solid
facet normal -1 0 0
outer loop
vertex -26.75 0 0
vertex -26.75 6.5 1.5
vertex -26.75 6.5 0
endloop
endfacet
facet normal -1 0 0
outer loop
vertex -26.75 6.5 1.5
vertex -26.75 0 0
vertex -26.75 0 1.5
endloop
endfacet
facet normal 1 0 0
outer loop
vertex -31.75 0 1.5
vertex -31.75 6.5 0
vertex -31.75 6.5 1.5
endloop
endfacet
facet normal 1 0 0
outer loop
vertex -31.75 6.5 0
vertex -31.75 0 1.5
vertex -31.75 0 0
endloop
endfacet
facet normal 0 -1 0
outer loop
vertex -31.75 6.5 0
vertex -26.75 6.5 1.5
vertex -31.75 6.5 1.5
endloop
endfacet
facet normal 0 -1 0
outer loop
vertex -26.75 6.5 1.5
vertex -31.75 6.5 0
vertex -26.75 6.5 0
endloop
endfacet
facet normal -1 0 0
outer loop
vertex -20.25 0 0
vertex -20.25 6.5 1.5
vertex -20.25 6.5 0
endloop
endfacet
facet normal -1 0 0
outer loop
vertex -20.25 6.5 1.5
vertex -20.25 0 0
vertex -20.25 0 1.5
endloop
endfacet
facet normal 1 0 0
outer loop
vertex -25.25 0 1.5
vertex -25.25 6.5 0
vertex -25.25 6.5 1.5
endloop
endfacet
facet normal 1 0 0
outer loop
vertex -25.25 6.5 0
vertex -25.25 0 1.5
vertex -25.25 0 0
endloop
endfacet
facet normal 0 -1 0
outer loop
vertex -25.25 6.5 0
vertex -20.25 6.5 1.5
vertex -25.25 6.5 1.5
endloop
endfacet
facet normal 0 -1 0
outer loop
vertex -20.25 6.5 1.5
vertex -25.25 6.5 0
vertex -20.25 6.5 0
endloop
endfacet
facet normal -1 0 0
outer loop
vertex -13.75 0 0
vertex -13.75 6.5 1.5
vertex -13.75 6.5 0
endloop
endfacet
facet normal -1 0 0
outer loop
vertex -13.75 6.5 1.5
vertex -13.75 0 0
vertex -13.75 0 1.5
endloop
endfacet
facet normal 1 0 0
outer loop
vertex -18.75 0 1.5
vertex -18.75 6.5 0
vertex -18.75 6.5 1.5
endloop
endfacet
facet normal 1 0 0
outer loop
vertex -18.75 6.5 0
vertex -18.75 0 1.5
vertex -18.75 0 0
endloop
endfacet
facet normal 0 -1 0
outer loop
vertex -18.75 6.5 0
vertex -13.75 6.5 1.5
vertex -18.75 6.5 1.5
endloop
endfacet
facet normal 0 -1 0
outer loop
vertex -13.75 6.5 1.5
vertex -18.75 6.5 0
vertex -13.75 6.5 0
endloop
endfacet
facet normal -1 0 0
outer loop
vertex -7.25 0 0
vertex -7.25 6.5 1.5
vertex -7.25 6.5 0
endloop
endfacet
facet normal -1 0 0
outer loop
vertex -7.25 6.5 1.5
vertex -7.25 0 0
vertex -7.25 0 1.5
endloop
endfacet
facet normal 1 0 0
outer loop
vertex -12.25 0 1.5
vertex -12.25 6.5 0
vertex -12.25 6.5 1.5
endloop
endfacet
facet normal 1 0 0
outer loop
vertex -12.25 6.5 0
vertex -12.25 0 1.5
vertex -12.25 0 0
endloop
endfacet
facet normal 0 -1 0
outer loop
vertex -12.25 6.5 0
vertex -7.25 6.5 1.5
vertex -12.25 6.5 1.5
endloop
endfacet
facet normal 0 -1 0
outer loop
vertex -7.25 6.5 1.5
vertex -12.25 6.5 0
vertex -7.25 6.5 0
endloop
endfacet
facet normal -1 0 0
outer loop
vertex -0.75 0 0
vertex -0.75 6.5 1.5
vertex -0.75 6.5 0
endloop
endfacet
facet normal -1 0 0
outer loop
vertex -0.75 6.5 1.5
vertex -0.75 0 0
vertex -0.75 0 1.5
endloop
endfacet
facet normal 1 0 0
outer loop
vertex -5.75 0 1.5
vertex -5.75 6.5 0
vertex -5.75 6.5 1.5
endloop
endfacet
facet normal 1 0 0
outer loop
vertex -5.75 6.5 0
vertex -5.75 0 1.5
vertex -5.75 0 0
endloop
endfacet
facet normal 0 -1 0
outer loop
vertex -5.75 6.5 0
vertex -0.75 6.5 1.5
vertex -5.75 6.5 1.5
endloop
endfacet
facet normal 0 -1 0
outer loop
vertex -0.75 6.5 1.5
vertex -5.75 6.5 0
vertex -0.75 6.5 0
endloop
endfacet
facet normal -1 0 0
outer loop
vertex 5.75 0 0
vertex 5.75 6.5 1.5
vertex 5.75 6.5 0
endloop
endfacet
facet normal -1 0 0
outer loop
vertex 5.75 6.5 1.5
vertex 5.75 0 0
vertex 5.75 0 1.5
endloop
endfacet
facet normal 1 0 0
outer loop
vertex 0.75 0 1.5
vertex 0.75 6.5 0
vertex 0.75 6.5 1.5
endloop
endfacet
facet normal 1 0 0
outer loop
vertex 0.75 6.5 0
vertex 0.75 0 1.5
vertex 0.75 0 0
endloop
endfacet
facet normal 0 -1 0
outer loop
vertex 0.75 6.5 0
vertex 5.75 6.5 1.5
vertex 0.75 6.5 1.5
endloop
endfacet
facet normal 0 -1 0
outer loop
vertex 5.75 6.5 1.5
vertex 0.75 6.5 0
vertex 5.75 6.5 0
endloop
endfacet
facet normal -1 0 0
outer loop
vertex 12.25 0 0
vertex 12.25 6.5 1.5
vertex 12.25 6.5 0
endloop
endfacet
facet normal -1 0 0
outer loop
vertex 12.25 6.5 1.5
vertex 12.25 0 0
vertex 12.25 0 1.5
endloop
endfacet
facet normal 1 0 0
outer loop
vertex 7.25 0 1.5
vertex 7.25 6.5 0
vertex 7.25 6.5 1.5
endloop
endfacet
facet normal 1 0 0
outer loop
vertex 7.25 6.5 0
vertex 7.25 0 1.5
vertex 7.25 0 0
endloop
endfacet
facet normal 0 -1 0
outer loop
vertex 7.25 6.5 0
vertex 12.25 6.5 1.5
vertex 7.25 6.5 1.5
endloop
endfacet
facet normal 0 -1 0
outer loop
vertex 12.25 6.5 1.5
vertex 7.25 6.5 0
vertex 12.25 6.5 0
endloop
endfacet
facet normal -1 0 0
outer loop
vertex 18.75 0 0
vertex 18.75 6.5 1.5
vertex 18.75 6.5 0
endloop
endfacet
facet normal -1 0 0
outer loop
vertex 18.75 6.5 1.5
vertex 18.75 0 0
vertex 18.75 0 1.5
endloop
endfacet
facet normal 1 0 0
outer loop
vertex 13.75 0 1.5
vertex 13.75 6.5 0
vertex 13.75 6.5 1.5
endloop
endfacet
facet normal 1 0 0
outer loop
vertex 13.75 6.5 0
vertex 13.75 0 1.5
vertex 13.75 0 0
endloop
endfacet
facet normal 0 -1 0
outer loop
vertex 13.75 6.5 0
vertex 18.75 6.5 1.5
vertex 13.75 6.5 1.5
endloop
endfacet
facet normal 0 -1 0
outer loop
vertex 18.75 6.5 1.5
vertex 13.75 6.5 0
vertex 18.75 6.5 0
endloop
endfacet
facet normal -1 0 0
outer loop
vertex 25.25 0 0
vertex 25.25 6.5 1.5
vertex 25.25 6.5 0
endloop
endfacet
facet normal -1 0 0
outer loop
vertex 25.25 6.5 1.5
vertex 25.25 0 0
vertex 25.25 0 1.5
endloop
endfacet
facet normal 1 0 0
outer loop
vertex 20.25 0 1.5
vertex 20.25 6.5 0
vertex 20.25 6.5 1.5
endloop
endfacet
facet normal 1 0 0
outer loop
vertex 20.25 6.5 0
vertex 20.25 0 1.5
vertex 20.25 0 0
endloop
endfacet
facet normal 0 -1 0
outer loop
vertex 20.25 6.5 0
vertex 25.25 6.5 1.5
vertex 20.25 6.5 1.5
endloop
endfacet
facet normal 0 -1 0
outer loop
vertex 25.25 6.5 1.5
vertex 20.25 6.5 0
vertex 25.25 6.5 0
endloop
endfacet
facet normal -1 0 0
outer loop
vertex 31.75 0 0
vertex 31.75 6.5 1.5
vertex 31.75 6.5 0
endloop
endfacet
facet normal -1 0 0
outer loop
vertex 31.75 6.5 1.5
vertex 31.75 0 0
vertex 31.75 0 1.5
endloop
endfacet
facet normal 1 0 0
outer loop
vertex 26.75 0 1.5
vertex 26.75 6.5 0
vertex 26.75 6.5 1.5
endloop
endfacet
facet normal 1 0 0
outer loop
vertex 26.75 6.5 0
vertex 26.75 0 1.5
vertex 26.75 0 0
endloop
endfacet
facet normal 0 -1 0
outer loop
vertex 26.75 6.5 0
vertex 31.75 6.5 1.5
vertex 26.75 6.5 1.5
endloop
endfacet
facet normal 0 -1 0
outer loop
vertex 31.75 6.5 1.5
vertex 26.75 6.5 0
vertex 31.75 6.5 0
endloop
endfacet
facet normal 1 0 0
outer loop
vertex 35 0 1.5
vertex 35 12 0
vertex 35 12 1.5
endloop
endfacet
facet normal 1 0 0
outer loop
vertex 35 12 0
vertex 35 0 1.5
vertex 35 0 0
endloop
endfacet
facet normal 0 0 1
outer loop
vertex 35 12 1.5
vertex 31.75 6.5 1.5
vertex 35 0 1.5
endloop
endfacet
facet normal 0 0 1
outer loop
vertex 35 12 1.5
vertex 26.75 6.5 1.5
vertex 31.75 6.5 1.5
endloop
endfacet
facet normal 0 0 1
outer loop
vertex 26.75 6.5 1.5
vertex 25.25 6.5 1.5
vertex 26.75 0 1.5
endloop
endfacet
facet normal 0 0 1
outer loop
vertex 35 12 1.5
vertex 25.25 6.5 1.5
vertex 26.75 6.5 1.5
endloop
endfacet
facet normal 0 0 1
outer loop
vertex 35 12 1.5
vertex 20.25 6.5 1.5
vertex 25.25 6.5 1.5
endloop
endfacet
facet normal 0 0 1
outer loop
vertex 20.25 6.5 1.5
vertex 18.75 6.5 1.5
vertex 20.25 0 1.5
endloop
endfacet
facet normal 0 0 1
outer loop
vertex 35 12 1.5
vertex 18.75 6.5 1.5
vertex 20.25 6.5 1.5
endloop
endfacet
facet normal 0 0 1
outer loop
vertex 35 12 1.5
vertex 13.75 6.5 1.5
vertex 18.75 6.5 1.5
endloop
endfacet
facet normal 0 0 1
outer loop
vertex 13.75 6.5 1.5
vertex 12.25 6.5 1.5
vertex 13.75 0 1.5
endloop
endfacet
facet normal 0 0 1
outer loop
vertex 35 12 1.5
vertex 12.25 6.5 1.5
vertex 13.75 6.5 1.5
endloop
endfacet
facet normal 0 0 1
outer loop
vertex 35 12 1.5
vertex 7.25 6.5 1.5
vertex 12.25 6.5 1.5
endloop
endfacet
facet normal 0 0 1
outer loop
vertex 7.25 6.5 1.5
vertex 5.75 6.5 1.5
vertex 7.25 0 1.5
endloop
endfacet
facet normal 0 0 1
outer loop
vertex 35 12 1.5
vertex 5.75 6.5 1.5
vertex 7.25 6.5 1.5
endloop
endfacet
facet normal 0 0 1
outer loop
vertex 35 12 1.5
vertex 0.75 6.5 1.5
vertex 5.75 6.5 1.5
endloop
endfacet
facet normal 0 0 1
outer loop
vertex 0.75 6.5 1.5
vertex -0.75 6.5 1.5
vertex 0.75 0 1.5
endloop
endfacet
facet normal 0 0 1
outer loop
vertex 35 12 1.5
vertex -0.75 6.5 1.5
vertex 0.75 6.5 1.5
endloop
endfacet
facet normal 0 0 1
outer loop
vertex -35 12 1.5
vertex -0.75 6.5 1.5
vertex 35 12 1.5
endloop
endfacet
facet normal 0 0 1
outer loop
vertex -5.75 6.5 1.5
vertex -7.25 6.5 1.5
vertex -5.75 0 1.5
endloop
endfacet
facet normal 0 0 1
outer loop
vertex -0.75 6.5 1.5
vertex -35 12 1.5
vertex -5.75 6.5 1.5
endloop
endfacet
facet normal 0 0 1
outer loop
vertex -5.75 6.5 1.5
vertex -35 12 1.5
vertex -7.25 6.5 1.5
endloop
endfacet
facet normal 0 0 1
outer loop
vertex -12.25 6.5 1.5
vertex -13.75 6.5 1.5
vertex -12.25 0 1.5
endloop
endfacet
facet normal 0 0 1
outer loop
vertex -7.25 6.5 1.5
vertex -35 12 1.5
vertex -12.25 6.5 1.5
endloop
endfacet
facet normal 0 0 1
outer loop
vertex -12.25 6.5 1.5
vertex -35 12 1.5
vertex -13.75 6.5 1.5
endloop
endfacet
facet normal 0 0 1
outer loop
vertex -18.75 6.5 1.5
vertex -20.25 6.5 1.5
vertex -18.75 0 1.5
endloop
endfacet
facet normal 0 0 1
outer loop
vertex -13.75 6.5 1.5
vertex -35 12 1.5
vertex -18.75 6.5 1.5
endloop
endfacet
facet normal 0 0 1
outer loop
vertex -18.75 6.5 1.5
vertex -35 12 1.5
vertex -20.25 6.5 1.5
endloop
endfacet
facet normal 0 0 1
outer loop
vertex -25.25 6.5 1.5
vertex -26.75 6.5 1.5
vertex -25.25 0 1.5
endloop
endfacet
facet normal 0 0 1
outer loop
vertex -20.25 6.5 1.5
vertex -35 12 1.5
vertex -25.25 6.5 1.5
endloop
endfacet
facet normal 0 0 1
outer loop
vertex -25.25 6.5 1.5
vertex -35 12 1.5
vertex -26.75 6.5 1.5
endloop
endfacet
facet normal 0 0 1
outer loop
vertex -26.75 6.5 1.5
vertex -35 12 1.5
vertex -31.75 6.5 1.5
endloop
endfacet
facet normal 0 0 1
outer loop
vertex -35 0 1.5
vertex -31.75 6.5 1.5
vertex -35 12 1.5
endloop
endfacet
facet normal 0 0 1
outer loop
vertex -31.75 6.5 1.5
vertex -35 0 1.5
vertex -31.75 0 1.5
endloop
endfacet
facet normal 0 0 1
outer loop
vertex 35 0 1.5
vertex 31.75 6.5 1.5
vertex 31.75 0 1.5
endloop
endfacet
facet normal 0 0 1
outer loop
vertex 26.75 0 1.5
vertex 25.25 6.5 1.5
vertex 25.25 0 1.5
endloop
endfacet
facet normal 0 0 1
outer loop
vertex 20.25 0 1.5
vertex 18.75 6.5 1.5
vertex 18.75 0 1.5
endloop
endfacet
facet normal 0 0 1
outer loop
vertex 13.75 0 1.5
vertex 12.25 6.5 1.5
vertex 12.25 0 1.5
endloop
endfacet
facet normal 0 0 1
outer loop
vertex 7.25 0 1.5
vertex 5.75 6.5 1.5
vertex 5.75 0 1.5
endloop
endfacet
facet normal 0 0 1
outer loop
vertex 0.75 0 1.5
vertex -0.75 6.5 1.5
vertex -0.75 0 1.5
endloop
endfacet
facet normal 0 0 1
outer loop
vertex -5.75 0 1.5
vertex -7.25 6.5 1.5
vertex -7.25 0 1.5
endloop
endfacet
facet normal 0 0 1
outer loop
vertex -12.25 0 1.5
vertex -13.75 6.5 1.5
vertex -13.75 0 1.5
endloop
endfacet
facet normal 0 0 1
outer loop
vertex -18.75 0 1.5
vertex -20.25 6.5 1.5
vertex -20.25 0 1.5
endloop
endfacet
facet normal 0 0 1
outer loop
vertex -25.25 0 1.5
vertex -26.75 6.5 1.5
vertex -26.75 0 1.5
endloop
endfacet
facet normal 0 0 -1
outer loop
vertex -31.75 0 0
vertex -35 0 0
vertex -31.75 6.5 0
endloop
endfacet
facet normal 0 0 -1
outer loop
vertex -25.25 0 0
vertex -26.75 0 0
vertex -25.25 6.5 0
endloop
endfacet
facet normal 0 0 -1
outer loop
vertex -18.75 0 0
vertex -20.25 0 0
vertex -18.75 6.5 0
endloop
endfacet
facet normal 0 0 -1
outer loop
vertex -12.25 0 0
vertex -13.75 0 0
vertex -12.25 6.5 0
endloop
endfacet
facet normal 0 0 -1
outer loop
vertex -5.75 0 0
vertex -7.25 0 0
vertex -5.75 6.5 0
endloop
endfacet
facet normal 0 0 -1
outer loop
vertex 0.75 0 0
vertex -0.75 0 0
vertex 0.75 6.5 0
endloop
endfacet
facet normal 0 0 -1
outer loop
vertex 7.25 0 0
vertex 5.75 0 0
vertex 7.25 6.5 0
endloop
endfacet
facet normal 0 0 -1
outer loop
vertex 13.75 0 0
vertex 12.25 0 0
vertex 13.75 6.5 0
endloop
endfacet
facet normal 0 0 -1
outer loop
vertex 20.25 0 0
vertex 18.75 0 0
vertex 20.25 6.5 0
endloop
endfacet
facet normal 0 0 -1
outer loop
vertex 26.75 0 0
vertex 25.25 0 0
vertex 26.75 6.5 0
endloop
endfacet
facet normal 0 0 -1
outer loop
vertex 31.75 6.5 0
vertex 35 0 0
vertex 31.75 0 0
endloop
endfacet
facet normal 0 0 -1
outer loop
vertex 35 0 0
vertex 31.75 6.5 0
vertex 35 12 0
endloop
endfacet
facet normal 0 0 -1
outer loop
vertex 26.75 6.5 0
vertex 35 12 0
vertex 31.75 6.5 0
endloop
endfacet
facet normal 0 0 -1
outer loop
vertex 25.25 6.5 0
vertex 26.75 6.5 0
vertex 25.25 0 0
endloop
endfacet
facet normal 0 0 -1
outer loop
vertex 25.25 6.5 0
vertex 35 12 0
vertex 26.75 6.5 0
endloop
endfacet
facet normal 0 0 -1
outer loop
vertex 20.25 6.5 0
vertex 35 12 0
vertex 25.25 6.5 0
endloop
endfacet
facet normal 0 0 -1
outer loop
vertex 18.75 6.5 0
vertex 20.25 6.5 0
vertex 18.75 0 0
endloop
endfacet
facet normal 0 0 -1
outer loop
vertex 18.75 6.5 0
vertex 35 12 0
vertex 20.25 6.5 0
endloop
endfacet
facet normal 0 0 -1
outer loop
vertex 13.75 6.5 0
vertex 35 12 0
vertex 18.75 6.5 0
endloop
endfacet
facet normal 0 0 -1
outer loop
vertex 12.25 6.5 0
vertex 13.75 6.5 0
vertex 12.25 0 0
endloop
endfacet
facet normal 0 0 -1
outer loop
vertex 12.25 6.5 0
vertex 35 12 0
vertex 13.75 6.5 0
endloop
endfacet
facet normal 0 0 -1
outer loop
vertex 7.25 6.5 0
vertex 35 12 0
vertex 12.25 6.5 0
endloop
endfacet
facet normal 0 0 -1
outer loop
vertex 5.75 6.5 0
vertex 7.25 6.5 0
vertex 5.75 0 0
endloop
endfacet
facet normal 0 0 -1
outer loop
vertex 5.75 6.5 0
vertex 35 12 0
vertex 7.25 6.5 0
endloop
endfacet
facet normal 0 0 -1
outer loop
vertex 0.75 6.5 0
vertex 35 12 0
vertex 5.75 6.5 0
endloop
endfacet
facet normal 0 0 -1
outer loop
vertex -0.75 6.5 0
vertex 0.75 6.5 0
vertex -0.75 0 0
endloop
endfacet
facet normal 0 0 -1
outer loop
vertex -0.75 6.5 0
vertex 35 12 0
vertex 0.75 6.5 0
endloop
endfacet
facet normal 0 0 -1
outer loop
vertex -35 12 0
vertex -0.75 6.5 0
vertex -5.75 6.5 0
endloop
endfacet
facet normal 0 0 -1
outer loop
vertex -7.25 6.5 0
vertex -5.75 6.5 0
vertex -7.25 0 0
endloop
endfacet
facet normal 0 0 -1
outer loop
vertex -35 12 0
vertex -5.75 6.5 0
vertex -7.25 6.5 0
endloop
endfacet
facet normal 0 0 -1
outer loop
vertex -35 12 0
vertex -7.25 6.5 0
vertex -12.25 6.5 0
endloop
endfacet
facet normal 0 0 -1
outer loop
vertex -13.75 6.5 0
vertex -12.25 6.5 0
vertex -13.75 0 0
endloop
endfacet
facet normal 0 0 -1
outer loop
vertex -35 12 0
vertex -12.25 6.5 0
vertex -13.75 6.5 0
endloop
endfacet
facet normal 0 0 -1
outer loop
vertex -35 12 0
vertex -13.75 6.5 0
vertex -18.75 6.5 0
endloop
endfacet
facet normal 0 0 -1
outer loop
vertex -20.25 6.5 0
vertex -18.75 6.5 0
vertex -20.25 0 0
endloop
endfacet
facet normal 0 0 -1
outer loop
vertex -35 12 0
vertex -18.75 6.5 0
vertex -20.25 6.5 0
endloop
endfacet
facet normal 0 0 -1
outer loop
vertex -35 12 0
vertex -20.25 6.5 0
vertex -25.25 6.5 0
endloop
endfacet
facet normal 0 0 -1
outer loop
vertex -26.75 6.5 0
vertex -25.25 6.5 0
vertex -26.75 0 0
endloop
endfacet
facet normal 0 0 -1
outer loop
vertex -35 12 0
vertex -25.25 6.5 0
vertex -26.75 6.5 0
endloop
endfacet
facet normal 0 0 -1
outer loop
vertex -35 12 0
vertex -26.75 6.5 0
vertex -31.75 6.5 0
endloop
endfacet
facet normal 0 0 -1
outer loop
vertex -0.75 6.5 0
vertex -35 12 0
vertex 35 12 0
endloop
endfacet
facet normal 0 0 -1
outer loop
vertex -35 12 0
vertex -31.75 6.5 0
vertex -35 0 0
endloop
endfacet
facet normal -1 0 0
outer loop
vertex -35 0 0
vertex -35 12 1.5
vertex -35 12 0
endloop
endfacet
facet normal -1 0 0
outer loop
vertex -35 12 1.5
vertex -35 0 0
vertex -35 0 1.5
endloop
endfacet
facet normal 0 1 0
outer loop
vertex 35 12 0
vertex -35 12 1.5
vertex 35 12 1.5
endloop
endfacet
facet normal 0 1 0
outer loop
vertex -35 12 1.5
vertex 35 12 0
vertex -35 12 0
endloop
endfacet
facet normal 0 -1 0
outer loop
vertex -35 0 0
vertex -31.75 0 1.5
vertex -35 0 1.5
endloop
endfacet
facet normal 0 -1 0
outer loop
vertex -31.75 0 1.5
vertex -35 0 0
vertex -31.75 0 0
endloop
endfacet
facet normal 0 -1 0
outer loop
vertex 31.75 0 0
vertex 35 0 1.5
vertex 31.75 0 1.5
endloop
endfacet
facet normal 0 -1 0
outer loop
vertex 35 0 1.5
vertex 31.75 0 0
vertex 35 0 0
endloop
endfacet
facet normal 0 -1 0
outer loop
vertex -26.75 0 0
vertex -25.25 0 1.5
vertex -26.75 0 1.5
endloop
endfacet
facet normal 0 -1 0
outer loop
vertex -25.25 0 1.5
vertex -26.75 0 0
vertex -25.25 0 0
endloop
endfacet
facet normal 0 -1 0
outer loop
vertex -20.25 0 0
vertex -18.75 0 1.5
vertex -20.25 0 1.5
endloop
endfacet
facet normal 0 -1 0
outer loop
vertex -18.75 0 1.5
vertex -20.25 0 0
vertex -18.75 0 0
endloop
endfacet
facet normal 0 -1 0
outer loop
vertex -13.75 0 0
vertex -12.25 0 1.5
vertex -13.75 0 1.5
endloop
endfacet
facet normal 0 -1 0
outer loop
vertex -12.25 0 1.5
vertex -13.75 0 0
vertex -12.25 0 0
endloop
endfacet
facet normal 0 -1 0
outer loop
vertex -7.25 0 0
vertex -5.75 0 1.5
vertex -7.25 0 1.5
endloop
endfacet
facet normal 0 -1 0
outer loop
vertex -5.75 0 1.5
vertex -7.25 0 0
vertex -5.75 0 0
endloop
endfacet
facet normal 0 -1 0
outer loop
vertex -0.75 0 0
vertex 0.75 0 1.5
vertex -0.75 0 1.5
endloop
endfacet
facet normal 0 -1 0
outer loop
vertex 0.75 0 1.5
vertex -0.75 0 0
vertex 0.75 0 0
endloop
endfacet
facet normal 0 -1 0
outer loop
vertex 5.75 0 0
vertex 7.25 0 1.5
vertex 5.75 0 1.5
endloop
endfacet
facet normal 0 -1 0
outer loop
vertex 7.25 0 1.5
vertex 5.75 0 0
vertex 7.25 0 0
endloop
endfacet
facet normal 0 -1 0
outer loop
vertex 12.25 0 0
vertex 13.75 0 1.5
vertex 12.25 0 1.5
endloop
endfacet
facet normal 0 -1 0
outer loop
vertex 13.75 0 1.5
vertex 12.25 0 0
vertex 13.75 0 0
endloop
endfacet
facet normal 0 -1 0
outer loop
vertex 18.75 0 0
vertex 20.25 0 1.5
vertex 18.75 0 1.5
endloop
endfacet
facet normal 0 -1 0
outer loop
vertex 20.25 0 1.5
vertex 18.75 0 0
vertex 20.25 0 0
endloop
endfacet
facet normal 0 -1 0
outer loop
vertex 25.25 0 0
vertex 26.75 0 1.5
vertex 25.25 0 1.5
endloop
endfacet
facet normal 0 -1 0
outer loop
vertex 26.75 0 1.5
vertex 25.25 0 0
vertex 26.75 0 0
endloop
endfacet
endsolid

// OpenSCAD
// 10-well comb for casting agarose gels
// Print orientation: flat on bed, spine (back bar) along +X, teeth in -Y

// ---------- Parameters ----------
spine_len    = 70;    // spine length (X)
spine_w      = 12;    // spine width (Y)
plate_t      = 1.5;   // plate thickness (Z)
tooth_count  = 10;    // number of teeth
tooth_w      = 5.0;   // tooth width (X)
tooth_l      = 12;    // tooth length (Y)
tooth_gap    = 1.5;   // gap between neighbouring teeth (X)
eps          = 0.5;   // cutter overshoot past faces

$fn = 64;

// ---------- Derived ----------
pitch   = tooth_w + tooth_gap;          // centre-to-centre spacing
x_start = -(tooth_count - 1) * pitch / 2; // first tooth centre (row centred on spine)
tooth_h = tooth_l + eps;                // cutter height from top face

// ---------- Model ----------
difference() {
    // Base plate
    translate([-spine_len/2, 0, 0])
        cube([spine_len, spine_w, plate_t]);

    // Teeth cutters (through the full thickness, overshooting top and bottom)
    for (i = [0 : tooth_count - 1])
        translate([x_start + i * pitch - tooth_w/2,
                   -spine_w/2 - eps,
                   -eps])
            cube([tooth_w, tooth_l + 2*eps, plate_t + 2*eps]);
}
